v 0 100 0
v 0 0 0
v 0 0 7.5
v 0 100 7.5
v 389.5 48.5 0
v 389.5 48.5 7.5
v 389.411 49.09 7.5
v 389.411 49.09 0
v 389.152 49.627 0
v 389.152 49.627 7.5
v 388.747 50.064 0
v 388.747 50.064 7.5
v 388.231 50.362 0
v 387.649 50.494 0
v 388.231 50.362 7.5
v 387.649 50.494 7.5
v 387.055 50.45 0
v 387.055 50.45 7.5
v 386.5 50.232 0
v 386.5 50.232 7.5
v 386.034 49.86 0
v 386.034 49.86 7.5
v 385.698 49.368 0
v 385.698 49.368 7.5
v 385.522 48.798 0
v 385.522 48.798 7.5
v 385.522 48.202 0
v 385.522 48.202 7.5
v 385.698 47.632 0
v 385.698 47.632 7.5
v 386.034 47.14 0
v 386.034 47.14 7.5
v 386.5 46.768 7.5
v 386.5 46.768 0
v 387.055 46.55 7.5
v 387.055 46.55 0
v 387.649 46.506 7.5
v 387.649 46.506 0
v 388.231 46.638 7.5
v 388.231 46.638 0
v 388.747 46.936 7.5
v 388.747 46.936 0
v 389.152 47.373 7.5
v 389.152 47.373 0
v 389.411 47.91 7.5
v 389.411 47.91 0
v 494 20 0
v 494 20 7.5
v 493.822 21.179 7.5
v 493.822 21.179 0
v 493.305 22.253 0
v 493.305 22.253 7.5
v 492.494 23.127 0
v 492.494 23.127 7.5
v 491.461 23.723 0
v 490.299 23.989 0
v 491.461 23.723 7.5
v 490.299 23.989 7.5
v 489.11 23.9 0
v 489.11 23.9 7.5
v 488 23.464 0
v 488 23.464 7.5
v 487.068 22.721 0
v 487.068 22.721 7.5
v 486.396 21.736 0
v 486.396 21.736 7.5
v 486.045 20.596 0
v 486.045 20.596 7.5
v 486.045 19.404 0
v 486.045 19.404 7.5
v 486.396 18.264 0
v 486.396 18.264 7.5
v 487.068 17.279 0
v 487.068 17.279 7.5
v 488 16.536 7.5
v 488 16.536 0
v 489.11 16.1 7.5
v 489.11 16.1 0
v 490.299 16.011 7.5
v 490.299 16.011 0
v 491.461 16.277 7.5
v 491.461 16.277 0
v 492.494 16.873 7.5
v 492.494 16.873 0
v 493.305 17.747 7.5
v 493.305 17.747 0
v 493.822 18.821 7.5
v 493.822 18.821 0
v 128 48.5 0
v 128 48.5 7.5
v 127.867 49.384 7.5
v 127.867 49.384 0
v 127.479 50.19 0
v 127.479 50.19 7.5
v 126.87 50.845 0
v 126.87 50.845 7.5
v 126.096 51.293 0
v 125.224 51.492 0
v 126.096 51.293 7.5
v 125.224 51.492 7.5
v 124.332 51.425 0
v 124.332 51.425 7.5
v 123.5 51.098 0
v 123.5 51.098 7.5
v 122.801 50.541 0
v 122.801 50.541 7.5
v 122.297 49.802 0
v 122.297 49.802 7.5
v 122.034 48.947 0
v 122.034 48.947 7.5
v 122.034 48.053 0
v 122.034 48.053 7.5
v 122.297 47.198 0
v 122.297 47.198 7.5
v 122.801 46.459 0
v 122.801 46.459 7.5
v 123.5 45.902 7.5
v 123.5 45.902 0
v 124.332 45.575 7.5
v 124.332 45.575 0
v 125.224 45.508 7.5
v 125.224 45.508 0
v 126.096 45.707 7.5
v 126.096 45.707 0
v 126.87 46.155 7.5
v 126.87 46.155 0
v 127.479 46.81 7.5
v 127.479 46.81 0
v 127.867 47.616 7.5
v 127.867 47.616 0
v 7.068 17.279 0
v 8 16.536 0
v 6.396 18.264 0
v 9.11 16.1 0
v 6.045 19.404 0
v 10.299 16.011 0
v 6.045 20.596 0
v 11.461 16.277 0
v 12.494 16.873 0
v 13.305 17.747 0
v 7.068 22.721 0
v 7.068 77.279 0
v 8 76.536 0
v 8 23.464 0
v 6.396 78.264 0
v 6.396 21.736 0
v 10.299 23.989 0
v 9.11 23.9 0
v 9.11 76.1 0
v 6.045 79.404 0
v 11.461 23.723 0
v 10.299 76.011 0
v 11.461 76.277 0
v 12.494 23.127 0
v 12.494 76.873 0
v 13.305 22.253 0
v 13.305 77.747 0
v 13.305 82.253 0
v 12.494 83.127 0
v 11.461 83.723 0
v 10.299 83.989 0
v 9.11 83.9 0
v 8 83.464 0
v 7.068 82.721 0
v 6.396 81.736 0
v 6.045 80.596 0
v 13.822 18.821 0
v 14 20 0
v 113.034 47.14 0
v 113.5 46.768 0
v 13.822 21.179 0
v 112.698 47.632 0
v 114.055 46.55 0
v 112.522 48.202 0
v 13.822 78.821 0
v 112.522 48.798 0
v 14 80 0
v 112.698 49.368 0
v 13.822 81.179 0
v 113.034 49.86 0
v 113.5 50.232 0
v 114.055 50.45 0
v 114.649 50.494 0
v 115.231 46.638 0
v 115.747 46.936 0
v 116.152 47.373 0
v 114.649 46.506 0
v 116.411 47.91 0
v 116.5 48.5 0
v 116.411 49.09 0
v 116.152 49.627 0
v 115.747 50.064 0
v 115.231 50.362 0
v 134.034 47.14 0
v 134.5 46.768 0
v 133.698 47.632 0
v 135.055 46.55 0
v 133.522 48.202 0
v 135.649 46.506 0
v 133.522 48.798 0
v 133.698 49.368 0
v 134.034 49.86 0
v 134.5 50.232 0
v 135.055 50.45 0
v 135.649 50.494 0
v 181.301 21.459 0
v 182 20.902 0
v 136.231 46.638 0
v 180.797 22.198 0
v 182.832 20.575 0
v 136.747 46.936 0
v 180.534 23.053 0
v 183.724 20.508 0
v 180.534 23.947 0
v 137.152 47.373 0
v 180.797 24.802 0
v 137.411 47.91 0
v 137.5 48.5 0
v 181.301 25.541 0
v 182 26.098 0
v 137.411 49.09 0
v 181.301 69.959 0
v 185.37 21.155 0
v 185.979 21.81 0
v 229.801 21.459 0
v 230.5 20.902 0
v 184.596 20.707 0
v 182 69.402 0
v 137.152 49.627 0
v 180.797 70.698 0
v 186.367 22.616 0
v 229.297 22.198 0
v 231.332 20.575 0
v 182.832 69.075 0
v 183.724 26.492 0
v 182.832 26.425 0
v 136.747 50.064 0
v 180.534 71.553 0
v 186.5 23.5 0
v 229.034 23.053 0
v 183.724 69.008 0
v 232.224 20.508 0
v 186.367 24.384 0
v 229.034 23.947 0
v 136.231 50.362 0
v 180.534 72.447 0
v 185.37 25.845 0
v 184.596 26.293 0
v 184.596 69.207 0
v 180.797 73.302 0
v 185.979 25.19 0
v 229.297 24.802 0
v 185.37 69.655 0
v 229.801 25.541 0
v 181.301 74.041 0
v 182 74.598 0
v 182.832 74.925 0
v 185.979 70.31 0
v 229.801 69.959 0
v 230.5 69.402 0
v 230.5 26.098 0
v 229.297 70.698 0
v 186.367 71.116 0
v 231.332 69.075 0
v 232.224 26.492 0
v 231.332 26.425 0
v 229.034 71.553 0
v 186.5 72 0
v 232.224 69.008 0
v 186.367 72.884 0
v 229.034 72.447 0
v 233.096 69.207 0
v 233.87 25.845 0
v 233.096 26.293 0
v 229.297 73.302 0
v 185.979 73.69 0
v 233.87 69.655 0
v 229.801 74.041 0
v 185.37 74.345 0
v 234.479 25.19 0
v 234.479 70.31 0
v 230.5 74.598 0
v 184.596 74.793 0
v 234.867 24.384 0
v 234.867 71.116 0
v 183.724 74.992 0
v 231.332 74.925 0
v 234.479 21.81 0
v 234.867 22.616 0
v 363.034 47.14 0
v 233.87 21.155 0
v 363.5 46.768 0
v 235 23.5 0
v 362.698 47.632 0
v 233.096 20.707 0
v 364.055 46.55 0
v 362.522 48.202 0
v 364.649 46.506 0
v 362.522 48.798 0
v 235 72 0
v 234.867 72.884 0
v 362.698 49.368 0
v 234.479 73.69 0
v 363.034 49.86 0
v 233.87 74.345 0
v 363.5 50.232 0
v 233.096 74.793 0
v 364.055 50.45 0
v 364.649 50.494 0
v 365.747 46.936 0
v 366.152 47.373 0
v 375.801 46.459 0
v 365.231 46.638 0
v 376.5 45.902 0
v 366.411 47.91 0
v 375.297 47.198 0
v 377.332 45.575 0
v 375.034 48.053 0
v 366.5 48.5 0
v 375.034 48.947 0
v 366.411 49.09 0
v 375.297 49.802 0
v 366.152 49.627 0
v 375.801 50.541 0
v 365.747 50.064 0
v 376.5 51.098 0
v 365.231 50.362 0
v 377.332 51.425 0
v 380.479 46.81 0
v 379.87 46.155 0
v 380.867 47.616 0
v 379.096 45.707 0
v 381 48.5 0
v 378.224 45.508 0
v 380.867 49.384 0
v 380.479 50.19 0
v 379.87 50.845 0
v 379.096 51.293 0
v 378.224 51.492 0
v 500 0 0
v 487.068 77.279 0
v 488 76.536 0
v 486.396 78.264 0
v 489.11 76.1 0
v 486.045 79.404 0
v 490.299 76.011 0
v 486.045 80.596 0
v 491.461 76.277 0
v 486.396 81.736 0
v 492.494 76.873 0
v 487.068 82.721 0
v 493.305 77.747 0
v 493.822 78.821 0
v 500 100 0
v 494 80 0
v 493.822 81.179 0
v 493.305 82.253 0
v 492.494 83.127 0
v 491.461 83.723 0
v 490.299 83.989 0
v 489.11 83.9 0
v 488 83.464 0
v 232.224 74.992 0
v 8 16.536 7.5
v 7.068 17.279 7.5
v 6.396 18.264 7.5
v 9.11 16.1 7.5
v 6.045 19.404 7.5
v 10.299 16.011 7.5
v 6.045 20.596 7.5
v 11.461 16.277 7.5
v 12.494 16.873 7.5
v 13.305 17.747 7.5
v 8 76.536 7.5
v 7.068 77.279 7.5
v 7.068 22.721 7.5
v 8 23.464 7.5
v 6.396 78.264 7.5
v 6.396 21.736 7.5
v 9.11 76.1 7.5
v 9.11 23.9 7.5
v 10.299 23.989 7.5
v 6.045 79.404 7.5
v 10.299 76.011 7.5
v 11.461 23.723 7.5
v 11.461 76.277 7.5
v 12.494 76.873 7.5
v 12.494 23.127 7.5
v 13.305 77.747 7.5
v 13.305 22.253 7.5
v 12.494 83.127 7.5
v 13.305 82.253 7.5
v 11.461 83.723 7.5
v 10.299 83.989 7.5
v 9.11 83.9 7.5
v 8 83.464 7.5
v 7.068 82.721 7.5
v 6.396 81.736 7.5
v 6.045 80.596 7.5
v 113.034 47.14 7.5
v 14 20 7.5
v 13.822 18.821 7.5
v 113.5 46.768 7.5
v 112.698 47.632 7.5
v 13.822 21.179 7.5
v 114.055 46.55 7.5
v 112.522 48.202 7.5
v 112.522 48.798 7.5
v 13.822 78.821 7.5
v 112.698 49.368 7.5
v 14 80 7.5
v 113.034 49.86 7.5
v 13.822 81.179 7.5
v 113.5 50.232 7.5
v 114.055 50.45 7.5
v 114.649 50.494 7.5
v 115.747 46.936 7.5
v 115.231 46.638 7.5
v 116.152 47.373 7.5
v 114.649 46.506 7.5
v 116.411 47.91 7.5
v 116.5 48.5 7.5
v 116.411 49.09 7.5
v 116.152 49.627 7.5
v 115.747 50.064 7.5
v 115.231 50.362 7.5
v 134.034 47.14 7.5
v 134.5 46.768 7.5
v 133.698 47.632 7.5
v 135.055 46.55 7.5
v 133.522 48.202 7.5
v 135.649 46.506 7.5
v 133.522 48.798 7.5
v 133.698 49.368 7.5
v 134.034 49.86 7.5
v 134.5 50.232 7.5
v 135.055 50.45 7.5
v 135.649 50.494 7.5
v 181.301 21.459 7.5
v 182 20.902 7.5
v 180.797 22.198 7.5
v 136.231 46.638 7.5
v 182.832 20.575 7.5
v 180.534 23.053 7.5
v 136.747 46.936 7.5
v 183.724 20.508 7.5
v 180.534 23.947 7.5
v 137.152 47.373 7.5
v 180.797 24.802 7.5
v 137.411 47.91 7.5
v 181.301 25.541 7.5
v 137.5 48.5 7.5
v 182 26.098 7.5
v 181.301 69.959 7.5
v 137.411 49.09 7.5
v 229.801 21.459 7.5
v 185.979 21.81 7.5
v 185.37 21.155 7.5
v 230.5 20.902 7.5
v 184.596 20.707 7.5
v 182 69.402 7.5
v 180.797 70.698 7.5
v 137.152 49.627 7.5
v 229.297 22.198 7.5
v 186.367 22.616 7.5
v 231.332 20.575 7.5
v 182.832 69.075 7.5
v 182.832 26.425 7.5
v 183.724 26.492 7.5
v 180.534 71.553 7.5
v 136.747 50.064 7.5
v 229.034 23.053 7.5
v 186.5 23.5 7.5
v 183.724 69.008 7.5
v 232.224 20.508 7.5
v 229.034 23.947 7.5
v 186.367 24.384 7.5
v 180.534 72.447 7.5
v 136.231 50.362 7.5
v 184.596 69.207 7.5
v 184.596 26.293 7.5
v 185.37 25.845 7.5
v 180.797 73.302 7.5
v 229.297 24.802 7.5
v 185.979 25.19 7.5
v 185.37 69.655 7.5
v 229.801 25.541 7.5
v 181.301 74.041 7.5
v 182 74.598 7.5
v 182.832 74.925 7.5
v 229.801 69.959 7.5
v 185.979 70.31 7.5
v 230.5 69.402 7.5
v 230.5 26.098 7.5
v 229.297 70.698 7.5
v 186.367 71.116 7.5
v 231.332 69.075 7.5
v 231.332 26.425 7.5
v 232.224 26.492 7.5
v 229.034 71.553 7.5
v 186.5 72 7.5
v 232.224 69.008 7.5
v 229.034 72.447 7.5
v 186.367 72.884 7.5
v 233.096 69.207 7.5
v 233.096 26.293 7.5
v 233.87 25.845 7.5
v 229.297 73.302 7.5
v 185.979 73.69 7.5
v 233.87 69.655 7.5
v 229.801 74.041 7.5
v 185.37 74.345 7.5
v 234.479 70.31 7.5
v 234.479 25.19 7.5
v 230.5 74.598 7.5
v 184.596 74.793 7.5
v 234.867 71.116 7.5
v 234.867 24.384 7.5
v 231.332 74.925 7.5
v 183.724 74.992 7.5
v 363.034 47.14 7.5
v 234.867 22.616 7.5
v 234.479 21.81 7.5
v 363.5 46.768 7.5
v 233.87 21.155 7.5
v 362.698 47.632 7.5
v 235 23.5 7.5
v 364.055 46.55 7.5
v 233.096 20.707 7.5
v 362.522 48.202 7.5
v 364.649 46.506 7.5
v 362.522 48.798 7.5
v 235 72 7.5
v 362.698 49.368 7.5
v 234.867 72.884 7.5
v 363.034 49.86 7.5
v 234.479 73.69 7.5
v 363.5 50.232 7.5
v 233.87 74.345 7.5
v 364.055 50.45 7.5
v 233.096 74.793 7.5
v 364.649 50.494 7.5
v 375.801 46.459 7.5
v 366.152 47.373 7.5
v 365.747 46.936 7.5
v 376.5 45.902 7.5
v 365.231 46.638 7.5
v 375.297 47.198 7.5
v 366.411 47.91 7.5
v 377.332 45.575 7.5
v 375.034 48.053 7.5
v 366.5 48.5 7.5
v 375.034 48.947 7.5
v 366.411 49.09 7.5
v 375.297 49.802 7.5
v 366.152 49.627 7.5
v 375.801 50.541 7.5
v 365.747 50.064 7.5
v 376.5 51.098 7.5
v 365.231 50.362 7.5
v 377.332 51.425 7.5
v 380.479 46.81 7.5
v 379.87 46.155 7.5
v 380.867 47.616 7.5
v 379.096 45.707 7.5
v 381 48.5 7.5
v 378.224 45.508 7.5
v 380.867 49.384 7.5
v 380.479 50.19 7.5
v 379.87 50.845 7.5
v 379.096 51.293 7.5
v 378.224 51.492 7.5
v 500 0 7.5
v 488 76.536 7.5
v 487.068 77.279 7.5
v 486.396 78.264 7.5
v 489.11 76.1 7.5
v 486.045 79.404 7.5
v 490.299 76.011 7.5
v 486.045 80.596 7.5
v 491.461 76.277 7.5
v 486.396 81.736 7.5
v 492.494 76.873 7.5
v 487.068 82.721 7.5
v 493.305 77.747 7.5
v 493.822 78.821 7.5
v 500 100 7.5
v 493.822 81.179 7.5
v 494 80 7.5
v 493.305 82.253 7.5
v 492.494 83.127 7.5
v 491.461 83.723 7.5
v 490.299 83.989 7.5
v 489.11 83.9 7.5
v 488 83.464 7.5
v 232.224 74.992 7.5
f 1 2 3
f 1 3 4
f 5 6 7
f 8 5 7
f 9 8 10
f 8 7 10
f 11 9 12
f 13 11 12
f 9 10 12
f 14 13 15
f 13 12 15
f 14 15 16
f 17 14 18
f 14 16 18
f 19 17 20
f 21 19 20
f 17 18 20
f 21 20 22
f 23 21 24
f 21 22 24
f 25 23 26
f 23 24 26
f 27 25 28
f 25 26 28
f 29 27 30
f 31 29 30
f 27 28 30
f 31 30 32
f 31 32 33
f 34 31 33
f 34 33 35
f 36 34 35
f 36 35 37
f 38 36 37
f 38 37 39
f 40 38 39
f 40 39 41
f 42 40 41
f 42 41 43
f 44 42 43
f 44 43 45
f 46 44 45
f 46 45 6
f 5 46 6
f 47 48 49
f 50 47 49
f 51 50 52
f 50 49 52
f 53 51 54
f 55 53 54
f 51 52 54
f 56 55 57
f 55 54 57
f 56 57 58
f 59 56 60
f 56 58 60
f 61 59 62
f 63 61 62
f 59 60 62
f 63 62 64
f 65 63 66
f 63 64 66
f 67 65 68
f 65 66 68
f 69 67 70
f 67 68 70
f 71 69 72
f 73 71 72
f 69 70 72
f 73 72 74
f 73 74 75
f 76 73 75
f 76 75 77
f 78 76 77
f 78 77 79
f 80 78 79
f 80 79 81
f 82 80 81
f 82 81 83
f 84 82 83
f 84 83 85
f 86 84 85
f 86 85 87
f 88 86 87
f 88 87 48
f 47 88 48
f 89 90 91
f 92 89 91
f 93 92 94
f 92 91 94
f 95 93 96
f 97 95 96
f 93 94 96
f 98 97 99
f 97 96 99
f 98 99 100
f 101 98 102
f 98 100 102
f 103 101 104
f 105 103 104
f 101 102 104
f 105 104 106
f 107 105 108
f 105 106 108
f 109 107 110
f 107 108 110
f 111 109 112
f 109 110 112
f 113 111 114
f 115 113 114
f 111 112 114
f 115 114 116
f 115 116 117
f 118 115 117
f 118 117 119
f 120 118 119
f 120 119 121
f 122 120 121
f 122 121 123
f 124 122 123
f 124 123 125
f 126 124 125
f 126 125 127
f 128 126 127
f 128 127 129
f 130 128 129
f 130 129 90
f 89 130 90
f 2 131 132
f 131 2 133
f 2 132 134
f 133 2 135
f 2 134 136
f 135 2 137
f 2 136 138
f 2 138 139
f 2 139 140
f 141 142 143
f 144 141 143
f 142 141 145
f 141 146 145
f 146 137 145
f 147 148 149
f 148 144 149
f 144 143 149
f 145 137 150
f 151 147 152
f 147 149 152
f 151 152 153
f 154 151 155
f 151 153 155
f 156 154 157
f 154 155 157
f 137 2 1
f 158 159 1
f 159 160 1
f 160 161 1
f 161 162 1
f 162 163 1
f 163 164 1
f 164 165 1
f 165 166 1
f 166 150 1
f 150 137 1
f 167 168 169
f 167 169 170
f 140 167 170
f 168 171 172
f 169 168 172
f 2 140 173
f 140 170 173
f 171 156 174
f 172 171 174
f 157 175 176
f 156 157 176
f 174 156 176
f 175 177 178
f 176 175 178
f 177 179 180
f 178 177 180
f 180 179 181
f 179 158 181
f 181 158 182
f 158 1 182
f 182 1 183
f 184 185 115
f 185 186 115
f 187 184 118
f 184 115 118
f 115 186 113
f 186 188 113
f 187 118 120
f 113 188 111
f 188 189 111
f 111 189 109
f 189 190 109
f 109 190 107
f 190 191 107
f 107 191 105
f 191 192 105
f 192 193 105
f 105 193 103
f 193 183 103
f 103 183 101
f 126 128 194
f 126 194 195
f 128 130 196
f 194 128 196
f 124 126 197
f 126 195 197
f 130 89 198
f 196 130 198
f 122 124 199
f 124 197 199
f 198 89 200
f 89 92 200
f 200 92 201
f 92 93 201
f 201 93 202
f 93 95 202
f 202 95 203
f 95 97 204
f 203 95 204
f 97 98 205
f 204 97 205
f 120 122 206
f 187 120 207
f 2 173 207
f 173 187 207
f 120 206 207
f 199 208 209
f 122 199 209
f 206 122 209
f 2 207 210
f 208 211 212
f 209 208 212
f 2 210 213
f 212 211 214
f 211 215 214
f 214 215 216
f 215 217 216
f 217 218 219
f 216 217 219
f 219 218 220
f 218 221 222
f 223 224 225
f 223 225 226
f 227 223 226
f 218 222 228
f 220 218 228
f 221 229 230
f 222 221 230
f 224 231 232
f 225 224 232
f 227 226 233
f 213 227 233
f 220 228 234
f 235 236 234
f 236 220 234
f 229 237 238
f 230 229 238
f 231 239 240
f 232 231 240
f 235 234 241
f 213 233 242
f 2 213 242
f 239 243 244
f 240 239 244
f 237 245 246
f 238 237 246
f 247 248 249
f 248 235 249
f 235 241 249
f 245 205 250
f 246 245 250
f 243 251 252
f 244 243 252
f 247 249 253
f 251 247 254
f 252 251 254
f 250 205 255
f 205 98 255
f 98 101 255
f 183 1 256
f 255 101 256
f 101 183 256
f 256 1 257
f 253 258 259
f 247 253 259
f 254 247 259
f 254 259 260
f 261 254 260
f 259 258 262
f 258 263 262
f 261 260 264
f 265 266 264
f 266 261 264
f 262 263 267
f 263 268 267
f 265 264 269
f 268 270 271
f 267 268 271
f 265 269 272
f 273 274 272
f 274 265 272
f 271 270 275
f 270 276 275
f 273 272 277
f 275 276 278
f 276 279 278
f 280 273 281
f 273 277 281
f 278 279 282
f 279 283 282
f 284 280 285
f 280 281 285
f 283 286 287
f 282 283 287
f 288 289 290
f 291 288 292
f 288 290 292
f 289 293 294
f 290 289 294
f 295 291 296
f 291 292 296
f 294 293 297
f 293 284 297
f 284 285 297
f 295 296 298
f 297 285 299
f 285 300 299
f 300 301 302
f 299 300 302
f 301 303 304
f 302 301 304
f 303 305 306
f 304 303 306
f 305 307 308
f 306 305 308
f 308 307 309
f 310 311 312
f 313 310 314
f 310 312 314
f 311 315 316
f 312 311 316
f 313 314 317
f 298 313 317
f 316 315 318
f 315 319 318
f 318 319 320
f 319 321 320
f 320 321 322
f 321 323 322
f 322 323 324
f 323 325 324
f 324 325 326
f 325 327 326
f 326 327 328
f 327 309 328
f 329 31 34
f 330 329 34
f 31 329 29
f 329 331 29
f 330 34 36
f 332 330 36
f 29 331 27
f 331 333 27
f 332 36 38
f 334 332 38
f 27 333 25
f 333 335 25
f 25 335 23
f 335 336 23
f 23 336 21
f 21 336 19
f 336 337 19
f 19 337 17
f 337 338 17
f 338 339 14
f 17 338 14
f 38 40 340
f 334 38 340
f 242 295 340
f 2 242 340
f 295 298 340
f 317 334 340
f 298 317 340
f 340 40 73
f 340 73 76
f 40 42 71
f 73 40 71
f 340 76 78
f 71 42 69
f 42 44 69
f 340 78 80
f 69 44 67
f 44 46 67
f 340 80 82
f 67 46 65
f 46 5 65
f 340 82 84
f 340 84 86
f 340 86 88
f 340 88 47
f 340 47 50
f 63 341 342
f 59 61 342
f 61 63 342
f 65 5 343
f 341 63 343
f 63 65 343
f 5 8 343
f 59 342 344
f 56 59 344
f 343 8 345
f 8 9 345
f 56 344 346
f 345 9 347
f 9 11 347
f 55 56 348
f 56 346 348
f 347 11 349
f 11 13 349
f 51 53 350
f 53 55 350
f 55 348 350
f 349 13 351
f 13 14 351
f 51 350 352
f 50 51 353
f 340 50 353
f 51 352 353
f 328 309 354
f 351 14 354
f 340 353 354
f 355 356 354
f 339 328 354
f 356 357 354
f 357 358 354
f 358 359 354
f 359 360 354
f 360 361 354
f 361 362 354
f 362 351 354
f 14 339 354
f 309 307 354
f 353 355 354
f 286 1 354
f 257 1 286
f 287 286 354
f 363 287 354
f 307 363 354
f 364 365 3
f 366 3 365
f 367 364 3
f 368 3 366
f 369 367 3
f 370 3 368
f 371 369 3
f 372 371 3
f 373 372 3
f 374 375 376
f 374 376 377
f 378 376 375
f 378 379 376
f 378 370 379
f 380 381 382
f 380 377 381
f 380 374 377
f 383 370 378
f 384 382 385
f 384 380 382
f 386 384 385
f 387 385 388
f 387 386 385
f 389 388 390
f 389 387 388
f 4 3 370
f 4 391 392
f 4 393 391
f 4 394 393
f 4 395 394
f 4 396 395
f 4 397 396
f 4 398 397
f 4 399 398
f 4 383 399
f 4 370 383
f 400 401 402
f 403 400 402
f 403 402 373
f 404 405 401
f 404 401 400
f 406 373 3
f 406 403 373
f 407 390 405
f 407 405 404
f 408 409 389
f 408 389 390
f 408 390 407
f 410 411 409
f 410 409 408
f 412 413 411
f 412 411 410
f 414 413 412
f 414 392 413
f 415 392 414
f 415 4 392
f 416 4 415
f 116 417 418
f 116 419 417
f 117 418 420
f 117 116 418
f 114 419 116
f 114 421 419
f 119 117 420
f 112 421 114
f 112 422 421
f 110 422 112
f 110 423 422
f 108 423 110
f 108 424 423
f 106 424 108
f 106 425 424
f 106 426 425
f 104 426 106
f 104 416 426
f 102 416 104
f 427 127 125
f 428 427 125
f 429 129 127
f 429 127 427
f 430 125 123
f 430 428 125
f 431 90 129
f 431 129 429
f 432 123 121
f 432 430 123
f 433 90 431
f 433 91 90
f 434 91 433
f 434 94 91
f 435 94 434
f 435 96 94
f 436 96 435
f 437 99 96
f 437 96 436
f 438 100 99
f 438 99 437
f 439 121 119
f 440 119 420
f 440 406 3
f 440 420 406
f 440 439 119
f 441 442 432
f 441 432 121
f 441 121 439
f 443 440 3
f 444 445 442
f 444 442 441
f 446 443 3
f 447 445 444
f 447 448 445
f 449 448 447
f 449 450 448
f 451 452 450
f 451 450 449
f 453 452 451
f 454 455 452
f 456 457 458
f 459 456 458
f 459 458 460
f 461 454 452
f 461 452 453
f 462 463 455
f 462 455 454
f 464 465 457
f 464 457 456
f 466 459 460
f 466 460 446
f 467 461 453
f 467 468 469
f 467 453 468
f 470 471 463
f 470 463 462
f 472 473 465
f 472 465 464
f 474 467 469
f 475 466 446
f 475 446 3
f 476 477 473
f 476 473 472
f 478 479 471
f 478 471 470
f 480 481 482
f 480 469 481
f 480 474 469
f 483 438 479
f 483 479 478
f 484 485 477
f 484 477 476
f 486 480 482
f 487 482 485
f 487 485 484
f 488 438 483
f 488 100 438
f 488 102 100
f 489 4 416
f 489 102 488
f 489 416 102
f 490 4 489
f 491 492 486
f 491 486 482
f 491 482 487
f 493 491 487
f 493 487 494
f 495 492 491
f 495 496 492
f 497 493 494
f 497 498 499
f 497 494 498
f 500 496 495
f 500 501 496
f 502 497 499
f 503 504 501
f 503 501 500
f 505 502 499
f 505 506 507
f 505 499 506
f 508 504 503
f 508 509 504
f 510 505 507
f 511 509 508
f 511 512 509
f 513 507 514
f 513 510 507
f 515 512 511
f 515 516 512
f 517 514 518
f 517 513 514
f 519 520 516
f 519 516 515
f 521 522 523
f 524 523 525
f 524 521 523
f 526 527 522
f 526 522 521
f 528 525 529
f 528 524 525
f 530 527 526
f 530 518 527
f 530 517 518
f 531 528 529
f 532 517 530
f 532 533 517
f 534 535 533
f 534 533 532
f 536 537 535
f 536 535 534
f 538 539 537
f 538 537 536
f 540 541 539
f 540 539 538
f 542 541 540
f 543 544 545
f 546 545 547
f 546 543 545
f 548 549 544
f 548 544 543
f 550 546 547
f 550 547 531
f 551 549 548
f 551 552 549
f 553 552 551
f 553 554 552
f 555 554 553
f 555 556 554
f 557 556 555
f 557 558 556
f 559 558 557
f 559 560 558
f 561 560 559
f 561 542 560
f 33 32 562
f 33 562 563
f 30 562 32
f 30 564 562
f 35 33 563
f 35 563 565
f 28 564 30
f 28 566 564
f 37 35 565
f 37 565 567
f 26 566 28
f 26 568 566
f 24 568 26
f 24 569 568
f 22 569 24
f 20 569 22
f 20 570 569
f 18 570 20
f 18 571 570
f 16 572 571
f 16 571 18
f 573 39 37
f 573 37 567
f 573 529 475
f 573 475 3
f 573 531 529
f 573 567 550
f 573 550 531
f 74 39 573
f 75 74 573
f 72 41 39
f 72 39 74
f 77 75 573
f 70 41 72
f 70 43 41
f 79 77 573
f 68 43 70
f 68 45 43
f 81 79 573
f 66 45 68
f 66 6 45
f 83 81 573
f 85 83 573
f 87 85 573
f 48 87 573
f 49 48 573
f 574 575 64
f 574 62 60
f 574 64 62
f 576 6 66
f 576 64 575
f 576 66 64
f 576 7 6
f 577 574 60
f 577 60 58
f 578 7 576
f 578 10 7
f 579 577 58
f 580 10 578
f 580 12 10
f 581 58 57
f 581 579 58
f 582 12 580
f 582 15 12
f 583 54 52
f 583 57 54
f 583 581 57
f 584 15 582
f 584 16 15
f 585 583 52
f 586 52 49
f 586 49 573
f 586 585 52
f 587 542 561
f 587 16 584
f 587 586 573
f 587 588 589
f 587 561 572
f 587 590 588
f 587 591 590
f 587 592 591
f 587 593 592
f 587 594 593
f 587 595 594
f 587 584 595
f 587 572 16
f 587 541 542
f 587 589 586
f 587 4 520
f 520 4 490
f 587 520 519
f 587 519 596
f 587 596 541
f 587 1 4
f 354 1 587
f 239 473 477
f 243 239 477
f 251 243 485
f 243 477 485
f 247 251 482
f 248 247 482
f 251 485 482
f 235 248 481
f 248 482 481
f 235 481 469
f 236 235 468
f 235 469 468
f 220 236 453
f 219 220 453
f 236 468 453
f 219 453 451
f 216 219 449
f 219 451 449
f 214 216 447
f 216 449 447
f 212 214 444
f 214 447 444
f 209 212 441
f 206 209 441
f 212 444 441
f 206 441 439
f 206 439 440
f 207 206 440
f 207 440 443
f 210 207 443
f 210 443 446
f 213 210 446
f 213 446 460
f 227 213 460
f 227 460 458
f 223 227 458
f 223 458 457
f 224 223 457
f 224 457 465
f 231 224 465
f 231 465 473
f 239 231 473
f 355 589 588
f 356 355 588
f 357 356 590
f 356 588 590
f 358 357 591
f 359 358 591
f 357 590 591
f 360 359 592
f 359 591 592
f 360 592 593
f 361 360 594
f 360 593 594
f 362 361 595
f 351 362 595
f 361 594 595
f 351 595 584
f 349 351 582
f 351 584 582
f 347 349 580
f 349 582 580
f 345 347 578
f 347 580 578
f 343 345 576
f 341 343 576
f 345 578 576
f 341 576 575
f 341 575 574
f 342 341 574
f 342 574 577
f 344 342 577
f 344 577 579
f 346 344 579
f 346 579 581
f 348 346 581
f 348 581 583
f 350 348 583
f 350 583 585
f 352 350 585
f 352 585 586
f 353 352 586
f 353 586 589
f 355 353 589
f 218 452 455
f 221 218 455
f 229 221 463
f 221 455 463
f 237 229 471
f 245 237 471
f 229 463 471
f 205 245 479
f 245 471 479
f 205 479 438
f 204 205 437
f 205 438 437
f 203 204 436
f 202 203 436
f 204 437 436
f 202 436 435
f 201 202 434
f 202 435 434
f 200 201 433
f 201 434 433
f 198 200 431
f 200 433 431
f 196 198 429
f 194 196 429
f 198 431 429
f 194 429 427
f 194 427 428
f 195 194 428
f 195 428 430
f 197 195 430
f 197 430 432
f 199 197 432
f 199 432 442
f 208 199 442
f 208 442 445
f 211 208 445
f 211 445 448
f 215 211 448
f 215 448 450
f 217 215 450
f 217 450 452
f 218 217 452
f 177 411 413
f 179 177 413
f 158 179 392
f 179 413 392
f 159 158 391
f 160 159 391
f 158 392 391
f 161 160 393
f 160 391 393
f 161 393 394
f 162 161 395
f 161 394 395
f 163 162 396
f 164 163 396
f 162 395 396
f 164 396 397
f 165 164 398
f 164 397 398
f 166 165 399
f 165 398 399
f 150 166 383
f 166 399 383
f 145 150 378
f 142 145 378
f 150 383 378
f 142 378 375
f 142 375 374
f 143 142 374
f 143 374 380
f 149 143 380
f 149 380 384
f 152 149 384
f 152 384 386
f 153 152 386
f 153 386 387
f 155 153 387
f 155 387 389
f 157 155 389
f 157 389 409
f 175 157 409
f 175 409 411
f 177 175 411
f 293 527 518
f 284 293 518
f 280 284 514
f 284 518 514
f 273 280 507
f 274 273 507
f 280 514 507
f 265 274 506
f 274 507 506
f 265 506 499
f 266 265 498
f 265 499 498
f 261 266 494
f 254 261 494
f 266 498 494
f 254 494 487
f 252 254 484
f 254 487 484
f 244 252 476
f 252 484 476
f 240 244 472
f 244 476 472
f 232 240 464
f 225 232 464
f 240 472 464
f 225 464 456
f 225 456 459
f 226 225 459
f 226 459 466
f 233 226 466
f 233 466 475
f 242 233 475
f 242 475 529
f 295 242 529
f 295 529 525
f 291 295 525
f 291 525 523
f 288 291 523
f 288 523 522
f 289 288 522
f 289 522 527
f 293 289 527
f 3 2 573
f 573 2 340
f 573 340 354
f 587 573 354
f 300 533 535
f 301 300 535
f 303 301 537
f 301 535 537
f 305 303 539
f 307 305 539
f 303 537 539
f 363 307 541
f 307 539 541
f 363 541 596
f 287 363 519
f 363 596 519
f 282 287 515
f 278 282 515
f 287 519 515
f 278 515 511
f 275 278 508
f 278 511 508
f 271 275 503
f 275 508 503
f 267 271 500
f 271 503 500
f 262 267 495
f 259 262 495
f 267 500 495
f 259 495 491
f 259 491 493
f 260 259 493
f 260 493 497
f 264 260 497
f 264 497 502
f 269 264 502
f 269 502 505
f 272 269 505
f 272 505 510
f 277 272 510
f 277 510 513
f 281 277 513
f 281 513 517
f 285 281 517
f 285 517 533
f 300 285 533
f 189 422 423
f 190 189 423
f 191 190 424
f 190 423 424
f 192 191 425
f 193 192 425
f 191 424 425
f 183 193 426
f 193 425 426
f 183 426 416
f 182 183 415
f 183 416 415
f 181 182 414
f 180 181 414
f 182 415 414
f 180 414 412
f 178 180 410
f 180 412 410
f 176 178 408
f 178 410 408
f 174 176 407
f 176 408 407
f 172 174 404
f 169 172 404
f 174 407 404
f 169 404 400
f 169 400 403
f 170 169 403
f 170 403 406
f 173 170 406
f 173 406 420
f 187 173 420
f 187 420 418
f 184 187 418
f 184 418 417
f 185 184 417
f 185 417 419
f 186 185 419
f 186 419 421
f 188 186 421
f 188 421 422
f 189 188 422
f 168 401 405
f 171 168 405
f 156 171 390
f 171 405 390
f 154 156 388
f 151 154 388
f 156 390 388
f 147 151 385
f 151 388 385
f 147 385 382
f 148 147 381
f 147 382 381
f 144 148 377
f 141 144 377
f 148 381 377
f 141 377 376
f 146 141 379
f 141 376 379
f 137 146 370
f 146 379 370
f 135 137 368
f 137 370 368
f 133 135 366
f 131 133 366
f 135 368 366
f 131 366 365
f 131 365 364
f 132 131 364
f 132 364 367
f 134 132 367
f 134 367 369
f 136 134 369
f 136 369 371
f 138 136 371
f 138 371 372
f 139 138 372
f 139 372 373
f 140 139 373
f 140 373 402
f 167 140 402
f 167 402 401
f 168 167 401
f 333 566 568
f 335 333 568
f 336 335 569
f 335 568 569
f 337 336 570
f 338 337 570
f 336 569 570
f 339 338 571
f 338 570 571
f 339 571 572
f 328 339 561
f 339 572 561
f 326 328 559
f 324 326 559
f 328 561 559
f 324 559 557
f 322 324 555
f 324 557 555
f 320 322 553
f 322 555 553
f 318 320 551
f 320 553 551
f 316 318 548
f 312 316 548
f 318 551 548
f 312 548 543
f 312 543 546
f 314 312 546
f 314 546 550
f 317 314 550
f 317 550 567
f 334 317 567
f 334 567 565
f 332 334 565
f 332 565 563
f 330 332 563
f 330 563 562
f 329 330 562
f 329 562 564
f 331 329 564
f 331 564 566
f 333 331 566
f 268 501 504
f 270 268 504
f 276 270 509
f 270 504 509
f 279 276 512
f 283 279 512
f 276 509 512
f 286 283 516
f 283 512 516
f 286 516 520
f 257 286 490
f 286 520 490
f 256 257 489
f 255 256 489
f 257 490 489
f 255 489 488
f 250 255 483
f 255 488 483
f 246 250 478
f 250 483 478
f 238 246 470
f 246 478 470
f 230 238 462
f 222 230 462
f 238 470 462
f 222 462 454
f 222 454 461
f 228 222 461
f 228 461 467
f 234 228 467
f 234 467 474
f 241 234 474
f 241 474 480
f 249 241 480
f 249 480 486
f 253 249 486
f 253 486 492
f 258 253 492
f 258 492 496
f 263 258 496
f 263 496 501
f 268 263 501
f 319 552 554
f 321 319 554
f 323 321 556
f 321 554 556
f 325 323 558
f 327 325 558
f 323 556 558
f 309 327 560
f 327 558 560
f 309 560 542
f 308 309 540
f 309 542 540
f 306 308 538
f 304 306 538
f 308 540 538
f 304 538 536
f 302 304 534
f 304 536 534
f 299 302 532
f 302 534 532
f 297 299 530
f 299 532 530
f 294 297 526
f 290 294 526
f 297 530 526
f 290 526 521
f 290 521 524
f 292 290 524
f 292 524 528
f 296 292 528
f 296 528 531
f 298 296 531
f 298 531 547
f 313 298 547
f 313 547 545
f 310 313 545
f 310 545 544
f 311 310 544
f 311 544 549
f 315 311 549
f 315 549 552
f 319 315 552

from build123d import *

# Parameters (mm, degrees)
SKETCH2_W           = 500
SKETCH2_H           = 100
BOSS_EXTRUDE1_DEPTH = 7.5
SKETCH8_R           = 3
CUT_EXTRUDE2_DEPTH  = 510.957106039
SKETCH9_R           = 3
SKETCH9_R_2         = 2
CUT_EXTRUDE3_DEPTH  = 510.957106039
SKETCH11_R          = 4
CUT_EXTRUDE4_DEPTH  = 510.957106039


with BuildPart() as part:
    # Sketch2 → Boss-Extrude1 (new body)
    with BuildSketch(Plane.XY):
        with Locations((250, 50)):
            Rectangle(SKETCH2_W, SKETCH2_H)
    extrude(amount=BOSS_EXTRUDE1_DEPTH)

    # Sketch8 → Cut-Extrude2 (cut, through all)
    with BuildSketch(Plane.XY.offset(7.5)):
        with Locations((183.5, 23.5)):
            Circle(SKETCH8_R)
        with Locations((183.5, 72)):
            Circle(SKETCH8_R)
        with Locations((232, 72)):
            Circle(SKETCH8_R)
        with Locations((232, 23.5)):
            Circle(SKETCH8_R)
    extrude(amount=-CUT_EXTRUDE2_DEPTH, mode=Mode.SUBTRACT)

    # Sketch9 → Cut-Extrude3 (cut, through all)
    with BuildSketch(Plane.XY.offset(7.5)):
        with Locations((125, 48.5)):
            Circle(SKETCH9_R)
        with Locations((135.5, 48.5)):
            Circle(SKETCH9_R_2)
        with Locations((114.5, 48.5)):
            Circle(SKETCH9_R_2)
        with Locations((378, 48.5)):
            Circle(SKETCH9_R)
        with Locations((387.5, 48.5)):
            Circle(SKETCH9_R_2)
        with Locations((364.5, 48.5)):
            Circle(SKETCH9_R_2)
    extrude(amount=-CUT_EXTRUDE3_DEPTH, mode=Mode.SUBTRACT)

    # Sketch11 → Cut-Extrude4 (cut, through all)
    with BuildSketch(Plane.XY.offset(7.5)):
        with Locations((10, 80)):
            Circle(SKETCH11_R)
        with Locations((10, 20)):
            Circle(SKETCH11_R)
        with Locations((490, 20)):
            Circle(SKETCH11_R)
        with Locations((490, 80)):
            Circle(SKETCH11_R)
    extrude(amount=-CUT_EXTRUDE4_DEPTH, mode=Mode.SUBTRACT)


solid = part.part
